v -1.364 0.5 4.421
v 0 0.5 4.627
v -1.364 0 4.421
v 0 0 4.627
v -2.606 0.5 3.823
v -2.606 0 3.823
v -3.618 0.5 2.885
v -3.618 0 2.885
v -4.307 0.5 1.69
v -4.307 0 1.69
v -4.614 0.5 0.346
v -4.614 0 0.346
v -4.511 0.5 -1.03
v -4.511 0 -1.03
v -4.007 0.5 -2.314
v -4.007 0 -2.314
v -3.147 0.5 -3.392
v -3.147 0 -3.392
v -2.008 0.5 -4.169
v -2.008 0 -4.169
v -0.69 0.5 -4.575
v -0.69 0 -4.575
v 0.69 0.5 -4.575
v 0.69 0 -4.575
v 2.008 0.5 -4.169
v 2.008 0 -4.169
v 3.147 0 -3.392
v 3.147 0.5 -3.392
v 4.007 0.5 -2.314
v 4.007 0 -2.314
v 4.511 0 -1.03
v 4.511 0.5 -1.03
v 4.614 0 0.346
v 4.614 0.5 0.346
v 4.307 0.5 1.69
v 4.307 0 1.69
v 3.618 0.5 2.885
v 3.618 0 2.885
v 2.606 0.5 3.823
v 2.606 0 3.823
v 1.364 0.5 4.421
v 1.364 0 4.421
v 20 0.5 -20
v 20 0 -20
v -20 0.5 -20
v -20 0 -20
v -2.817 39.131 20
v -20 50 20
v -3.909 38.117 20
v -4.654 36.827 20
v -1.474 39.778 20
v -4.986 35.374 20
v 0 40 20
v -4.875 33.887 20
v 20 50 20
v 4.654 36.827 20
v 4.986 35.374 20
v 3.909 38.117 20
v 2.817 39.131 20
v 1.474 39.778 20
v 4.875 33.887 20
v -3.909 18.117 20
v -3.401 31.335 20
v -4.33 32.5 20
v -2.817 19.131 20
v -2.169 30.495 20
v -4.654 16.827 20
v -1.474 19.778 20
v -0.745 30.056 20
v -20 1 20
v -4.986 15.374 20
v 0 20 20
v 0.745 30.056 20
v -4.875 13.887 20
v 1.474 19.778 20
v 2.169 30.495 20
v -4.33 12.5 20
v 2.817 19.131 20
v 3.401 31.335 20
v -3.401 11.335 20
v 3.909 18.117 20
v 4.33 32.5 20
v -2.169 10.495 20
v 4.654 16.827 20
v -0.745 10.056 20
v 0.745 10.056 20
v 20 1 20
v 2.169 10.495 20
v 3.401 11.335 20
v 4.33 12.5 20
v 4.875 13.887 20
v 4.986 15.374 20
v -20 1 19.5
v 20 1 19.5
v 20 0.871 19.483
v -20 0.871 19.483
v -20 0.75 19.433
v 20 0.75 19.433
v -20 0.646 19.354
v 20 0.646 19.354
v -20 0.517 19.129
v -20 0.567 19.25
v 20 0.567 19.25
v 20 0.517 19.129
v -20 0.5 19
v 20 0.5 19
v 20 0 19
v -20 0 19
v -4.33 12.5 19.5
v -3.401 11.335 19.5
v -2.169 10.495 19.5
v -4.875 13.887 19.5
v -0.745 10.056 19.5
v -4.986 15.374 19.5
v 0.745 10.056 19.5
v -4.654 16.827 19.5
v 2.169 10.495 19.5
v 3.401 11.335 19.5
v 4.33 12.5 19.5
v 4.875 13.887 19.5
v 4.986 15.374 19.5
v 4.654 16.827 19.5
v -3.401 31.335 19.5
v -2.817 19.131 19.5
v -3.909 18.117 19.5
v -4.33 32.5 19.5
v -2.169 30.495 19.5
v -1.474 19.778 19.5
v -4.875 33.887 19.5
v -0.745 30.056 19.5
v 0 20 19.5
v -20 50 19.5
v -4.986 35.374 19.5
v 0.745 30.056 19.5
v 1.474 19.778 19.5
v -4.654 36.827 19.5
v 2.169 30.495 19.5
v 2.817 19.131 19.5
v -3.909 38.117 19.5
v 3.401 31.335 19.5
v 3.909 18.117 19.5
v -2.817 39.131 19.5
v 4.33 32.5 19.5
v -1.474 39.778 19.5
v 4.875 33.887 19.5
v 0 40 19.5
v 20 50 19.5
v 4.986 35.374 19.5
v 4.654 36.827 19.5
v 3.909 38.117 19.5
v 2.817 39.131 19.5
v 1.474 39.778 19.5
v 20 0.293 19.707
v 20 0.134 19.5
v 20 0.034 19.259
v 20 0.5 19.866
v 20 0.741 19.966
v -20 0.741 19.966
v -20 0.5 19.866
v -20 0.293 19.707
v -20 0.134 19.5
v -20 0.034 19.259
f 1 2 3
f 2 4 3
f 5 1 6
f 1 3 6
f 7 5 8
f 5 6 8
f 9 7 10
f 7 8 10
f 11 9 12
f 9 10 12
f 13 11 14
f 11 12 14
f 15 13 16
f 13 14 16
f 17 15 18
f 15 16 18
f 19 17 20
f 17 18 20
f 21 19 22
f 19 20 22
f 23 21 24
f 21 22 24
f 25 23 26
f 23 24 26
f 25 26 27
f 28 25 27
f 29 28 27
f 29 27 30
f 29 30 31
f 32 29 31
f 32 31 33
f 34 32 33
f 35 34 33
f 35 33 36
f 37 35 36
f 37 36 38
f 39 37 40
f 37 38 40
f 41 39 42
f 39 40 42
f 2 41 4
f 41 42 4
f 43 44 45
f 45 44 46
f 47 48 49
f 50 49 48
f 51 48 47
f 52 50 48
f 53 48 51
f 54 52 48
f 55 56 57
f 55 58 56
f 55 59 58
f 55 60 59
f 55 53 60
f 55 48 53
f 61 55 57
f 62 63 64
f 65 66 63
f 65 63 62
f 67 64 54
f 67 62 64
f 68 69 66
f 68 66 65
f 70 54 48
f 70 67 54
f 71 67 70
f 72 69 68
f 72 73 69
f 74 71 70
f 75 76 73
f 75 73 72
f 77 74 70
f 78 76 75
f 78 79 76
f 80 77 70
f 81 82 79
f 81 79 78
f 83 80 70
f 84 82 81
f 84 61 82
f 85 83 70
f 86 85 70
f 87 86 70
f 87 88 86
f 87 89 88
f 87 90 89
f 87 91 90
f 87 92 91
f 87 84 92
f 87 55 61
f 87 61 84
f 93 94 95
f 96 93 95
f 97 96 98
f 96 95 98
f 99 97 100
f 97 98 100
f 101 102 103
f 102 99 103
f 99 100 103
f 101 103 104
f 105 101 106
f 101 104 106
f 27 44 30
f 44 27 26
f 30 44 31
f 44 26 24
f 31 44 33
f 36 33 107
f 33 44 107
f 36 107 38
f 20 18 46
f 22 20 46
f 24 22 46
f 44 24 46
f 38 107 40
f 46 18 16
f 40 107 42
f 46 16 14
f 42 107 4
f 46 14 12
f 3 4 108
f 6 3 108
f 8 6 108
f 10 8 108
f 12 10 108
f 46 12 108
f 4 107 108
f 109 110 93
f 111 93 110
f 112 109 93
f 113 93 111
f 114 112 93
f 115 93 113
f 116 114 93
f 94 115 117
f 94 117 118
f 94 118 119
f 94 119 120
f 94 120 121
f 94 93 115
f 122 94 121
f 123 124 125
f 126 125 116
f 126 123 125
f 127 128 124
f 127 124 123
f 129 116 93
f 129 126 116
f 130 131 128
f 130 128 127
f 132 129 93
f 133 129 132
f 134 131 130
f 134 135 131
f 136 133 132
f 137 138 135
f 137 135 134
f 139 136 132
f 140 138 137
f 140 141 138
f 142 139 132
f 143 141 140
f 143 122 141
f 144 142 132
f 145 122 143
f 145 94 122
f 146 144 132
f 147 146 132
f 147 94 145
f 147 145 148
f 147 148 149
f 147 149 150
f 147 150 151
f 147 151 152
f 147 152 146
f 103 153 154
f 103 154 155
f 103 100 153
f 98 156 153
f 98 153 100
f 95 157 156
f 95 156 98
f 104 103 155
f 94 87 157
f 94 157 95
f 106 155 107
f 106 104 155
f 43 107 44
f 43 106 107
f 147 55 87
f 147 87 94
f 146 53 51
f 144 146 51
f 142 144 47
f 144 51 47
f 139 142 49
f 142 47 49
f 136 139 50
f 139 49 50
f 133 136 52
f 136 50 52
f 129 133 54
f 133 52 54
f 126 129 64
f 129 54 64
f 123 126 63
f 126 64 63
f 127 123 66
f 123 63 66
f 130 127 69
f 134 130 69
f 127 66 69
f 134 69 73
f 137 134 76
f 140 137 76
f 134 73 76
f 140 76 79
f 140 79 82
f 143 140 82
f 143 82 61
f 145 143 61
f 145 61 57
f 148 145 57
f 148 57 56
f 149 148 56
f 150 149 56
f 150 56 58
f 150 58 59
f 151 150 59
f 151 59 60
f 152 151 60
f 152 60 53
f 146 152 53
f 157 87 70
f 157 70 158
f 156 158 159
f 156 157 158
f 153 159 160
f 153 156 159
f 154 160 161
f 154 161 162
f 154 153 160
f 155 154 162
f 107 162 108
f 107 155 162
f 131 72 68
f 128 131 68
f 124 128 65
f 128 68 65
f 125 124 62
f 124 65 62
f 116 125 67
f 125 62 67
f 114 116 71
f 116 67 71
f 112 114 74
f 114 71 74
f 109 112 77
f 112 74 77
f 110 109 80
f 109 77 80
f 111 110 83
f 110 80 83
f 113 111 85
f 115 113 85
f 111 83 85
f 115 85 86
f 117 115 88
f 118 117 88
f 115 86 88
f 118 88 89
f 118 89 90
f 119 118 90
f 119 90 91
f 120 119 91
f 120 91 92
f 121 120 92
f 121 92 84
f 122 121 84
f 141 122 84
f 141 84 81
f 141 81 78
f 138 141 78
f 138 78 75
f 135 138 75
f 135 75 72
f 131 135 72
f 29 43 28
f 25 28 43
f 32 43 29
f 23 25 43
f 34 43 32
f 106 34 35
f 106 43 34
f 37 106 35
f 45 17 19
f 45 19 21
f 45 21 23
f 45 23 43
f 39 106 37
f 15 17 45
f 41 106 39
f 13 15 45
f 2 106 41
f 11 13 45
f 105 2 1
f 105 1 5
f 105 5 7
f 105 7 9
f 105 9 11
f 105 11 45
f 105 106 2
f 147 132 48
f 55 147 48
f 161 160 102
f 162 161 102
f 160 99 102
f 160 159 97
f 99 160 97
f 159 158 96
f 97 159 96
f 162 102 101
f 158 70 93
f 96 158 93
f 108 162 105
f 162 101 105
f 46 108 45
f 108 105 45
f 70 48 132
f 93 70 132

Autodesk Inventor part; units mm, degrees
ref_plane "YZ Plane" through (0, 0, 0) normal (1, 0, 0) x (0, 1, 0)
ref_plane "XZ Plane" through (0, 0, 0) normal (0, 1, 0) x (-1, 0, 0)
ref_plane "XY Plane" through (0, 0, 0) normal (0, 0, 1) x (1, 0, 0)
sketch "Sketch1" plane through (0, 0, 0) normal (0, 1, 0) x (-1, 0, 0)
  line L0 (-20, -20) -> (20, -20)
  line L1 (20, -20) -> (20, 20)
  line L2 (20, 20) -> (-20, 20)
  line L3 (-20, 20) -> (-20, -20)
  line L4 (-20, -20) -> (20, 20) construction
  line L5 (20, -20) -> (-20, 20) construction
  point P0 (0, 0)
  dimension "d0" = 40
  dimension "d1" = 40
extrude "Plate1" add sketch "Sketch1" along normal blind 0.5
sketch "Sketch2" plane through (20, 0, 19.5) normal (0, 0, 1) x (1, 0, 0)
  line L0 (-40, 0) -> (0, 0)
  line L1 (0, 0) -> (0, 50)
  line L2 (0, 50) -> (-40, 50)
  line L3 (-40, 50) -> (-40, 0)
edge flange "Flange1" height 50 angle 90 thickness 0.5 bend radius 0.5 thickness toward (0, 0, 1) relief tear relief width 0.5 relief depth 0.25 edges at (0, 0.5, 20) wall of the first edge with corners at (-20, 0, 19.5) (20, 0, 19.5) (20, 50, 19.5) (-20, 50, 19.5)
bend "Bend1"
corner "Corner1"
sketch "Sketch3" plane through (20, 50, 19.5) normal (0, 0, -1) x (-1, 0, 0)
  line L0 (40, 0) -> (0, 0) construction
  line L1 (20, 0) -> (20, -49) construction
  line L2 (0, -49) -> (40, -49) construction
  line L3 (0, 0) -> (0, -20) construction
  line L4 (0, 0) -> (0, -49) construction
  line L5 (0, -20) -> (0, -40) construction
  line L6 (40, 0) -> (40, -49) construction
  line L7 (0, 0) -> (1.6205, 0)
  line L8 (0, 0) -> (0, -15) construction
  line L9 (0, -15) -> (20, -15) construction
  circle A0 centre (20, -15) radius 5 construction
  line L10 (0, -15) -> (0, -35) construction
  line L11 (0, -35) -> (20, -35) construction
  circle A1 centre (20, -35) radius 5 construction
  point P0 (20, -50)
  dimension "d15" = 15
  dimension "d16" = 20
hole "Hole1" at (0, 35, 19.5) at (0, 15, 19.5) direction (0, 0, 1) diameter 10 end through all
sketch "Sketch4" plane through (0, 0.5, 0) normal (0, 1, 0) x (1, 0, 0)
  point P0 (0, 0)
hole "Hole2" at (0, 0.5, 0) direction (0, -1, 0) diameter 9.254 end through all
equation "\"d22\" = Thickness"
equation "\"d29\" = Thickness"
equation "\"d3\" = BendReliefWidth"
equation "\"d4\" = BendReliefDepth"
equation "\"d5\" = MinimumRemnant"
equation "\"d6\" = BendRadius"
equation "\"d9\" = BendRadius"
equation "\"d10\" = CornerReliefSize"
equation "\"d11\" = GapSize"
equation "\"d12\" = JacobiRadiusSize"
equation "\"BendRadius\" = Thickness"
equation "\"BendReliefWidth\" = Thickness"
equation "\"BendReliefDepth\" = 0.5 * Thickness"
equation "\"CornerReliefSize\" = 4 * Thickness"
equation "\"MinimumRemnant\" = 2 * Thickness"
equation "\"TransitionRadius\" = BendRadius"
equation "\"JacobiRadiusSize\" = BendRadius"
equation "\"GapSize\" = Thickness"
equation "\"d2\" = BendRadius"
equation "\"Thickness\" = 0.5"
properties part number "L Braket for Wheels"
